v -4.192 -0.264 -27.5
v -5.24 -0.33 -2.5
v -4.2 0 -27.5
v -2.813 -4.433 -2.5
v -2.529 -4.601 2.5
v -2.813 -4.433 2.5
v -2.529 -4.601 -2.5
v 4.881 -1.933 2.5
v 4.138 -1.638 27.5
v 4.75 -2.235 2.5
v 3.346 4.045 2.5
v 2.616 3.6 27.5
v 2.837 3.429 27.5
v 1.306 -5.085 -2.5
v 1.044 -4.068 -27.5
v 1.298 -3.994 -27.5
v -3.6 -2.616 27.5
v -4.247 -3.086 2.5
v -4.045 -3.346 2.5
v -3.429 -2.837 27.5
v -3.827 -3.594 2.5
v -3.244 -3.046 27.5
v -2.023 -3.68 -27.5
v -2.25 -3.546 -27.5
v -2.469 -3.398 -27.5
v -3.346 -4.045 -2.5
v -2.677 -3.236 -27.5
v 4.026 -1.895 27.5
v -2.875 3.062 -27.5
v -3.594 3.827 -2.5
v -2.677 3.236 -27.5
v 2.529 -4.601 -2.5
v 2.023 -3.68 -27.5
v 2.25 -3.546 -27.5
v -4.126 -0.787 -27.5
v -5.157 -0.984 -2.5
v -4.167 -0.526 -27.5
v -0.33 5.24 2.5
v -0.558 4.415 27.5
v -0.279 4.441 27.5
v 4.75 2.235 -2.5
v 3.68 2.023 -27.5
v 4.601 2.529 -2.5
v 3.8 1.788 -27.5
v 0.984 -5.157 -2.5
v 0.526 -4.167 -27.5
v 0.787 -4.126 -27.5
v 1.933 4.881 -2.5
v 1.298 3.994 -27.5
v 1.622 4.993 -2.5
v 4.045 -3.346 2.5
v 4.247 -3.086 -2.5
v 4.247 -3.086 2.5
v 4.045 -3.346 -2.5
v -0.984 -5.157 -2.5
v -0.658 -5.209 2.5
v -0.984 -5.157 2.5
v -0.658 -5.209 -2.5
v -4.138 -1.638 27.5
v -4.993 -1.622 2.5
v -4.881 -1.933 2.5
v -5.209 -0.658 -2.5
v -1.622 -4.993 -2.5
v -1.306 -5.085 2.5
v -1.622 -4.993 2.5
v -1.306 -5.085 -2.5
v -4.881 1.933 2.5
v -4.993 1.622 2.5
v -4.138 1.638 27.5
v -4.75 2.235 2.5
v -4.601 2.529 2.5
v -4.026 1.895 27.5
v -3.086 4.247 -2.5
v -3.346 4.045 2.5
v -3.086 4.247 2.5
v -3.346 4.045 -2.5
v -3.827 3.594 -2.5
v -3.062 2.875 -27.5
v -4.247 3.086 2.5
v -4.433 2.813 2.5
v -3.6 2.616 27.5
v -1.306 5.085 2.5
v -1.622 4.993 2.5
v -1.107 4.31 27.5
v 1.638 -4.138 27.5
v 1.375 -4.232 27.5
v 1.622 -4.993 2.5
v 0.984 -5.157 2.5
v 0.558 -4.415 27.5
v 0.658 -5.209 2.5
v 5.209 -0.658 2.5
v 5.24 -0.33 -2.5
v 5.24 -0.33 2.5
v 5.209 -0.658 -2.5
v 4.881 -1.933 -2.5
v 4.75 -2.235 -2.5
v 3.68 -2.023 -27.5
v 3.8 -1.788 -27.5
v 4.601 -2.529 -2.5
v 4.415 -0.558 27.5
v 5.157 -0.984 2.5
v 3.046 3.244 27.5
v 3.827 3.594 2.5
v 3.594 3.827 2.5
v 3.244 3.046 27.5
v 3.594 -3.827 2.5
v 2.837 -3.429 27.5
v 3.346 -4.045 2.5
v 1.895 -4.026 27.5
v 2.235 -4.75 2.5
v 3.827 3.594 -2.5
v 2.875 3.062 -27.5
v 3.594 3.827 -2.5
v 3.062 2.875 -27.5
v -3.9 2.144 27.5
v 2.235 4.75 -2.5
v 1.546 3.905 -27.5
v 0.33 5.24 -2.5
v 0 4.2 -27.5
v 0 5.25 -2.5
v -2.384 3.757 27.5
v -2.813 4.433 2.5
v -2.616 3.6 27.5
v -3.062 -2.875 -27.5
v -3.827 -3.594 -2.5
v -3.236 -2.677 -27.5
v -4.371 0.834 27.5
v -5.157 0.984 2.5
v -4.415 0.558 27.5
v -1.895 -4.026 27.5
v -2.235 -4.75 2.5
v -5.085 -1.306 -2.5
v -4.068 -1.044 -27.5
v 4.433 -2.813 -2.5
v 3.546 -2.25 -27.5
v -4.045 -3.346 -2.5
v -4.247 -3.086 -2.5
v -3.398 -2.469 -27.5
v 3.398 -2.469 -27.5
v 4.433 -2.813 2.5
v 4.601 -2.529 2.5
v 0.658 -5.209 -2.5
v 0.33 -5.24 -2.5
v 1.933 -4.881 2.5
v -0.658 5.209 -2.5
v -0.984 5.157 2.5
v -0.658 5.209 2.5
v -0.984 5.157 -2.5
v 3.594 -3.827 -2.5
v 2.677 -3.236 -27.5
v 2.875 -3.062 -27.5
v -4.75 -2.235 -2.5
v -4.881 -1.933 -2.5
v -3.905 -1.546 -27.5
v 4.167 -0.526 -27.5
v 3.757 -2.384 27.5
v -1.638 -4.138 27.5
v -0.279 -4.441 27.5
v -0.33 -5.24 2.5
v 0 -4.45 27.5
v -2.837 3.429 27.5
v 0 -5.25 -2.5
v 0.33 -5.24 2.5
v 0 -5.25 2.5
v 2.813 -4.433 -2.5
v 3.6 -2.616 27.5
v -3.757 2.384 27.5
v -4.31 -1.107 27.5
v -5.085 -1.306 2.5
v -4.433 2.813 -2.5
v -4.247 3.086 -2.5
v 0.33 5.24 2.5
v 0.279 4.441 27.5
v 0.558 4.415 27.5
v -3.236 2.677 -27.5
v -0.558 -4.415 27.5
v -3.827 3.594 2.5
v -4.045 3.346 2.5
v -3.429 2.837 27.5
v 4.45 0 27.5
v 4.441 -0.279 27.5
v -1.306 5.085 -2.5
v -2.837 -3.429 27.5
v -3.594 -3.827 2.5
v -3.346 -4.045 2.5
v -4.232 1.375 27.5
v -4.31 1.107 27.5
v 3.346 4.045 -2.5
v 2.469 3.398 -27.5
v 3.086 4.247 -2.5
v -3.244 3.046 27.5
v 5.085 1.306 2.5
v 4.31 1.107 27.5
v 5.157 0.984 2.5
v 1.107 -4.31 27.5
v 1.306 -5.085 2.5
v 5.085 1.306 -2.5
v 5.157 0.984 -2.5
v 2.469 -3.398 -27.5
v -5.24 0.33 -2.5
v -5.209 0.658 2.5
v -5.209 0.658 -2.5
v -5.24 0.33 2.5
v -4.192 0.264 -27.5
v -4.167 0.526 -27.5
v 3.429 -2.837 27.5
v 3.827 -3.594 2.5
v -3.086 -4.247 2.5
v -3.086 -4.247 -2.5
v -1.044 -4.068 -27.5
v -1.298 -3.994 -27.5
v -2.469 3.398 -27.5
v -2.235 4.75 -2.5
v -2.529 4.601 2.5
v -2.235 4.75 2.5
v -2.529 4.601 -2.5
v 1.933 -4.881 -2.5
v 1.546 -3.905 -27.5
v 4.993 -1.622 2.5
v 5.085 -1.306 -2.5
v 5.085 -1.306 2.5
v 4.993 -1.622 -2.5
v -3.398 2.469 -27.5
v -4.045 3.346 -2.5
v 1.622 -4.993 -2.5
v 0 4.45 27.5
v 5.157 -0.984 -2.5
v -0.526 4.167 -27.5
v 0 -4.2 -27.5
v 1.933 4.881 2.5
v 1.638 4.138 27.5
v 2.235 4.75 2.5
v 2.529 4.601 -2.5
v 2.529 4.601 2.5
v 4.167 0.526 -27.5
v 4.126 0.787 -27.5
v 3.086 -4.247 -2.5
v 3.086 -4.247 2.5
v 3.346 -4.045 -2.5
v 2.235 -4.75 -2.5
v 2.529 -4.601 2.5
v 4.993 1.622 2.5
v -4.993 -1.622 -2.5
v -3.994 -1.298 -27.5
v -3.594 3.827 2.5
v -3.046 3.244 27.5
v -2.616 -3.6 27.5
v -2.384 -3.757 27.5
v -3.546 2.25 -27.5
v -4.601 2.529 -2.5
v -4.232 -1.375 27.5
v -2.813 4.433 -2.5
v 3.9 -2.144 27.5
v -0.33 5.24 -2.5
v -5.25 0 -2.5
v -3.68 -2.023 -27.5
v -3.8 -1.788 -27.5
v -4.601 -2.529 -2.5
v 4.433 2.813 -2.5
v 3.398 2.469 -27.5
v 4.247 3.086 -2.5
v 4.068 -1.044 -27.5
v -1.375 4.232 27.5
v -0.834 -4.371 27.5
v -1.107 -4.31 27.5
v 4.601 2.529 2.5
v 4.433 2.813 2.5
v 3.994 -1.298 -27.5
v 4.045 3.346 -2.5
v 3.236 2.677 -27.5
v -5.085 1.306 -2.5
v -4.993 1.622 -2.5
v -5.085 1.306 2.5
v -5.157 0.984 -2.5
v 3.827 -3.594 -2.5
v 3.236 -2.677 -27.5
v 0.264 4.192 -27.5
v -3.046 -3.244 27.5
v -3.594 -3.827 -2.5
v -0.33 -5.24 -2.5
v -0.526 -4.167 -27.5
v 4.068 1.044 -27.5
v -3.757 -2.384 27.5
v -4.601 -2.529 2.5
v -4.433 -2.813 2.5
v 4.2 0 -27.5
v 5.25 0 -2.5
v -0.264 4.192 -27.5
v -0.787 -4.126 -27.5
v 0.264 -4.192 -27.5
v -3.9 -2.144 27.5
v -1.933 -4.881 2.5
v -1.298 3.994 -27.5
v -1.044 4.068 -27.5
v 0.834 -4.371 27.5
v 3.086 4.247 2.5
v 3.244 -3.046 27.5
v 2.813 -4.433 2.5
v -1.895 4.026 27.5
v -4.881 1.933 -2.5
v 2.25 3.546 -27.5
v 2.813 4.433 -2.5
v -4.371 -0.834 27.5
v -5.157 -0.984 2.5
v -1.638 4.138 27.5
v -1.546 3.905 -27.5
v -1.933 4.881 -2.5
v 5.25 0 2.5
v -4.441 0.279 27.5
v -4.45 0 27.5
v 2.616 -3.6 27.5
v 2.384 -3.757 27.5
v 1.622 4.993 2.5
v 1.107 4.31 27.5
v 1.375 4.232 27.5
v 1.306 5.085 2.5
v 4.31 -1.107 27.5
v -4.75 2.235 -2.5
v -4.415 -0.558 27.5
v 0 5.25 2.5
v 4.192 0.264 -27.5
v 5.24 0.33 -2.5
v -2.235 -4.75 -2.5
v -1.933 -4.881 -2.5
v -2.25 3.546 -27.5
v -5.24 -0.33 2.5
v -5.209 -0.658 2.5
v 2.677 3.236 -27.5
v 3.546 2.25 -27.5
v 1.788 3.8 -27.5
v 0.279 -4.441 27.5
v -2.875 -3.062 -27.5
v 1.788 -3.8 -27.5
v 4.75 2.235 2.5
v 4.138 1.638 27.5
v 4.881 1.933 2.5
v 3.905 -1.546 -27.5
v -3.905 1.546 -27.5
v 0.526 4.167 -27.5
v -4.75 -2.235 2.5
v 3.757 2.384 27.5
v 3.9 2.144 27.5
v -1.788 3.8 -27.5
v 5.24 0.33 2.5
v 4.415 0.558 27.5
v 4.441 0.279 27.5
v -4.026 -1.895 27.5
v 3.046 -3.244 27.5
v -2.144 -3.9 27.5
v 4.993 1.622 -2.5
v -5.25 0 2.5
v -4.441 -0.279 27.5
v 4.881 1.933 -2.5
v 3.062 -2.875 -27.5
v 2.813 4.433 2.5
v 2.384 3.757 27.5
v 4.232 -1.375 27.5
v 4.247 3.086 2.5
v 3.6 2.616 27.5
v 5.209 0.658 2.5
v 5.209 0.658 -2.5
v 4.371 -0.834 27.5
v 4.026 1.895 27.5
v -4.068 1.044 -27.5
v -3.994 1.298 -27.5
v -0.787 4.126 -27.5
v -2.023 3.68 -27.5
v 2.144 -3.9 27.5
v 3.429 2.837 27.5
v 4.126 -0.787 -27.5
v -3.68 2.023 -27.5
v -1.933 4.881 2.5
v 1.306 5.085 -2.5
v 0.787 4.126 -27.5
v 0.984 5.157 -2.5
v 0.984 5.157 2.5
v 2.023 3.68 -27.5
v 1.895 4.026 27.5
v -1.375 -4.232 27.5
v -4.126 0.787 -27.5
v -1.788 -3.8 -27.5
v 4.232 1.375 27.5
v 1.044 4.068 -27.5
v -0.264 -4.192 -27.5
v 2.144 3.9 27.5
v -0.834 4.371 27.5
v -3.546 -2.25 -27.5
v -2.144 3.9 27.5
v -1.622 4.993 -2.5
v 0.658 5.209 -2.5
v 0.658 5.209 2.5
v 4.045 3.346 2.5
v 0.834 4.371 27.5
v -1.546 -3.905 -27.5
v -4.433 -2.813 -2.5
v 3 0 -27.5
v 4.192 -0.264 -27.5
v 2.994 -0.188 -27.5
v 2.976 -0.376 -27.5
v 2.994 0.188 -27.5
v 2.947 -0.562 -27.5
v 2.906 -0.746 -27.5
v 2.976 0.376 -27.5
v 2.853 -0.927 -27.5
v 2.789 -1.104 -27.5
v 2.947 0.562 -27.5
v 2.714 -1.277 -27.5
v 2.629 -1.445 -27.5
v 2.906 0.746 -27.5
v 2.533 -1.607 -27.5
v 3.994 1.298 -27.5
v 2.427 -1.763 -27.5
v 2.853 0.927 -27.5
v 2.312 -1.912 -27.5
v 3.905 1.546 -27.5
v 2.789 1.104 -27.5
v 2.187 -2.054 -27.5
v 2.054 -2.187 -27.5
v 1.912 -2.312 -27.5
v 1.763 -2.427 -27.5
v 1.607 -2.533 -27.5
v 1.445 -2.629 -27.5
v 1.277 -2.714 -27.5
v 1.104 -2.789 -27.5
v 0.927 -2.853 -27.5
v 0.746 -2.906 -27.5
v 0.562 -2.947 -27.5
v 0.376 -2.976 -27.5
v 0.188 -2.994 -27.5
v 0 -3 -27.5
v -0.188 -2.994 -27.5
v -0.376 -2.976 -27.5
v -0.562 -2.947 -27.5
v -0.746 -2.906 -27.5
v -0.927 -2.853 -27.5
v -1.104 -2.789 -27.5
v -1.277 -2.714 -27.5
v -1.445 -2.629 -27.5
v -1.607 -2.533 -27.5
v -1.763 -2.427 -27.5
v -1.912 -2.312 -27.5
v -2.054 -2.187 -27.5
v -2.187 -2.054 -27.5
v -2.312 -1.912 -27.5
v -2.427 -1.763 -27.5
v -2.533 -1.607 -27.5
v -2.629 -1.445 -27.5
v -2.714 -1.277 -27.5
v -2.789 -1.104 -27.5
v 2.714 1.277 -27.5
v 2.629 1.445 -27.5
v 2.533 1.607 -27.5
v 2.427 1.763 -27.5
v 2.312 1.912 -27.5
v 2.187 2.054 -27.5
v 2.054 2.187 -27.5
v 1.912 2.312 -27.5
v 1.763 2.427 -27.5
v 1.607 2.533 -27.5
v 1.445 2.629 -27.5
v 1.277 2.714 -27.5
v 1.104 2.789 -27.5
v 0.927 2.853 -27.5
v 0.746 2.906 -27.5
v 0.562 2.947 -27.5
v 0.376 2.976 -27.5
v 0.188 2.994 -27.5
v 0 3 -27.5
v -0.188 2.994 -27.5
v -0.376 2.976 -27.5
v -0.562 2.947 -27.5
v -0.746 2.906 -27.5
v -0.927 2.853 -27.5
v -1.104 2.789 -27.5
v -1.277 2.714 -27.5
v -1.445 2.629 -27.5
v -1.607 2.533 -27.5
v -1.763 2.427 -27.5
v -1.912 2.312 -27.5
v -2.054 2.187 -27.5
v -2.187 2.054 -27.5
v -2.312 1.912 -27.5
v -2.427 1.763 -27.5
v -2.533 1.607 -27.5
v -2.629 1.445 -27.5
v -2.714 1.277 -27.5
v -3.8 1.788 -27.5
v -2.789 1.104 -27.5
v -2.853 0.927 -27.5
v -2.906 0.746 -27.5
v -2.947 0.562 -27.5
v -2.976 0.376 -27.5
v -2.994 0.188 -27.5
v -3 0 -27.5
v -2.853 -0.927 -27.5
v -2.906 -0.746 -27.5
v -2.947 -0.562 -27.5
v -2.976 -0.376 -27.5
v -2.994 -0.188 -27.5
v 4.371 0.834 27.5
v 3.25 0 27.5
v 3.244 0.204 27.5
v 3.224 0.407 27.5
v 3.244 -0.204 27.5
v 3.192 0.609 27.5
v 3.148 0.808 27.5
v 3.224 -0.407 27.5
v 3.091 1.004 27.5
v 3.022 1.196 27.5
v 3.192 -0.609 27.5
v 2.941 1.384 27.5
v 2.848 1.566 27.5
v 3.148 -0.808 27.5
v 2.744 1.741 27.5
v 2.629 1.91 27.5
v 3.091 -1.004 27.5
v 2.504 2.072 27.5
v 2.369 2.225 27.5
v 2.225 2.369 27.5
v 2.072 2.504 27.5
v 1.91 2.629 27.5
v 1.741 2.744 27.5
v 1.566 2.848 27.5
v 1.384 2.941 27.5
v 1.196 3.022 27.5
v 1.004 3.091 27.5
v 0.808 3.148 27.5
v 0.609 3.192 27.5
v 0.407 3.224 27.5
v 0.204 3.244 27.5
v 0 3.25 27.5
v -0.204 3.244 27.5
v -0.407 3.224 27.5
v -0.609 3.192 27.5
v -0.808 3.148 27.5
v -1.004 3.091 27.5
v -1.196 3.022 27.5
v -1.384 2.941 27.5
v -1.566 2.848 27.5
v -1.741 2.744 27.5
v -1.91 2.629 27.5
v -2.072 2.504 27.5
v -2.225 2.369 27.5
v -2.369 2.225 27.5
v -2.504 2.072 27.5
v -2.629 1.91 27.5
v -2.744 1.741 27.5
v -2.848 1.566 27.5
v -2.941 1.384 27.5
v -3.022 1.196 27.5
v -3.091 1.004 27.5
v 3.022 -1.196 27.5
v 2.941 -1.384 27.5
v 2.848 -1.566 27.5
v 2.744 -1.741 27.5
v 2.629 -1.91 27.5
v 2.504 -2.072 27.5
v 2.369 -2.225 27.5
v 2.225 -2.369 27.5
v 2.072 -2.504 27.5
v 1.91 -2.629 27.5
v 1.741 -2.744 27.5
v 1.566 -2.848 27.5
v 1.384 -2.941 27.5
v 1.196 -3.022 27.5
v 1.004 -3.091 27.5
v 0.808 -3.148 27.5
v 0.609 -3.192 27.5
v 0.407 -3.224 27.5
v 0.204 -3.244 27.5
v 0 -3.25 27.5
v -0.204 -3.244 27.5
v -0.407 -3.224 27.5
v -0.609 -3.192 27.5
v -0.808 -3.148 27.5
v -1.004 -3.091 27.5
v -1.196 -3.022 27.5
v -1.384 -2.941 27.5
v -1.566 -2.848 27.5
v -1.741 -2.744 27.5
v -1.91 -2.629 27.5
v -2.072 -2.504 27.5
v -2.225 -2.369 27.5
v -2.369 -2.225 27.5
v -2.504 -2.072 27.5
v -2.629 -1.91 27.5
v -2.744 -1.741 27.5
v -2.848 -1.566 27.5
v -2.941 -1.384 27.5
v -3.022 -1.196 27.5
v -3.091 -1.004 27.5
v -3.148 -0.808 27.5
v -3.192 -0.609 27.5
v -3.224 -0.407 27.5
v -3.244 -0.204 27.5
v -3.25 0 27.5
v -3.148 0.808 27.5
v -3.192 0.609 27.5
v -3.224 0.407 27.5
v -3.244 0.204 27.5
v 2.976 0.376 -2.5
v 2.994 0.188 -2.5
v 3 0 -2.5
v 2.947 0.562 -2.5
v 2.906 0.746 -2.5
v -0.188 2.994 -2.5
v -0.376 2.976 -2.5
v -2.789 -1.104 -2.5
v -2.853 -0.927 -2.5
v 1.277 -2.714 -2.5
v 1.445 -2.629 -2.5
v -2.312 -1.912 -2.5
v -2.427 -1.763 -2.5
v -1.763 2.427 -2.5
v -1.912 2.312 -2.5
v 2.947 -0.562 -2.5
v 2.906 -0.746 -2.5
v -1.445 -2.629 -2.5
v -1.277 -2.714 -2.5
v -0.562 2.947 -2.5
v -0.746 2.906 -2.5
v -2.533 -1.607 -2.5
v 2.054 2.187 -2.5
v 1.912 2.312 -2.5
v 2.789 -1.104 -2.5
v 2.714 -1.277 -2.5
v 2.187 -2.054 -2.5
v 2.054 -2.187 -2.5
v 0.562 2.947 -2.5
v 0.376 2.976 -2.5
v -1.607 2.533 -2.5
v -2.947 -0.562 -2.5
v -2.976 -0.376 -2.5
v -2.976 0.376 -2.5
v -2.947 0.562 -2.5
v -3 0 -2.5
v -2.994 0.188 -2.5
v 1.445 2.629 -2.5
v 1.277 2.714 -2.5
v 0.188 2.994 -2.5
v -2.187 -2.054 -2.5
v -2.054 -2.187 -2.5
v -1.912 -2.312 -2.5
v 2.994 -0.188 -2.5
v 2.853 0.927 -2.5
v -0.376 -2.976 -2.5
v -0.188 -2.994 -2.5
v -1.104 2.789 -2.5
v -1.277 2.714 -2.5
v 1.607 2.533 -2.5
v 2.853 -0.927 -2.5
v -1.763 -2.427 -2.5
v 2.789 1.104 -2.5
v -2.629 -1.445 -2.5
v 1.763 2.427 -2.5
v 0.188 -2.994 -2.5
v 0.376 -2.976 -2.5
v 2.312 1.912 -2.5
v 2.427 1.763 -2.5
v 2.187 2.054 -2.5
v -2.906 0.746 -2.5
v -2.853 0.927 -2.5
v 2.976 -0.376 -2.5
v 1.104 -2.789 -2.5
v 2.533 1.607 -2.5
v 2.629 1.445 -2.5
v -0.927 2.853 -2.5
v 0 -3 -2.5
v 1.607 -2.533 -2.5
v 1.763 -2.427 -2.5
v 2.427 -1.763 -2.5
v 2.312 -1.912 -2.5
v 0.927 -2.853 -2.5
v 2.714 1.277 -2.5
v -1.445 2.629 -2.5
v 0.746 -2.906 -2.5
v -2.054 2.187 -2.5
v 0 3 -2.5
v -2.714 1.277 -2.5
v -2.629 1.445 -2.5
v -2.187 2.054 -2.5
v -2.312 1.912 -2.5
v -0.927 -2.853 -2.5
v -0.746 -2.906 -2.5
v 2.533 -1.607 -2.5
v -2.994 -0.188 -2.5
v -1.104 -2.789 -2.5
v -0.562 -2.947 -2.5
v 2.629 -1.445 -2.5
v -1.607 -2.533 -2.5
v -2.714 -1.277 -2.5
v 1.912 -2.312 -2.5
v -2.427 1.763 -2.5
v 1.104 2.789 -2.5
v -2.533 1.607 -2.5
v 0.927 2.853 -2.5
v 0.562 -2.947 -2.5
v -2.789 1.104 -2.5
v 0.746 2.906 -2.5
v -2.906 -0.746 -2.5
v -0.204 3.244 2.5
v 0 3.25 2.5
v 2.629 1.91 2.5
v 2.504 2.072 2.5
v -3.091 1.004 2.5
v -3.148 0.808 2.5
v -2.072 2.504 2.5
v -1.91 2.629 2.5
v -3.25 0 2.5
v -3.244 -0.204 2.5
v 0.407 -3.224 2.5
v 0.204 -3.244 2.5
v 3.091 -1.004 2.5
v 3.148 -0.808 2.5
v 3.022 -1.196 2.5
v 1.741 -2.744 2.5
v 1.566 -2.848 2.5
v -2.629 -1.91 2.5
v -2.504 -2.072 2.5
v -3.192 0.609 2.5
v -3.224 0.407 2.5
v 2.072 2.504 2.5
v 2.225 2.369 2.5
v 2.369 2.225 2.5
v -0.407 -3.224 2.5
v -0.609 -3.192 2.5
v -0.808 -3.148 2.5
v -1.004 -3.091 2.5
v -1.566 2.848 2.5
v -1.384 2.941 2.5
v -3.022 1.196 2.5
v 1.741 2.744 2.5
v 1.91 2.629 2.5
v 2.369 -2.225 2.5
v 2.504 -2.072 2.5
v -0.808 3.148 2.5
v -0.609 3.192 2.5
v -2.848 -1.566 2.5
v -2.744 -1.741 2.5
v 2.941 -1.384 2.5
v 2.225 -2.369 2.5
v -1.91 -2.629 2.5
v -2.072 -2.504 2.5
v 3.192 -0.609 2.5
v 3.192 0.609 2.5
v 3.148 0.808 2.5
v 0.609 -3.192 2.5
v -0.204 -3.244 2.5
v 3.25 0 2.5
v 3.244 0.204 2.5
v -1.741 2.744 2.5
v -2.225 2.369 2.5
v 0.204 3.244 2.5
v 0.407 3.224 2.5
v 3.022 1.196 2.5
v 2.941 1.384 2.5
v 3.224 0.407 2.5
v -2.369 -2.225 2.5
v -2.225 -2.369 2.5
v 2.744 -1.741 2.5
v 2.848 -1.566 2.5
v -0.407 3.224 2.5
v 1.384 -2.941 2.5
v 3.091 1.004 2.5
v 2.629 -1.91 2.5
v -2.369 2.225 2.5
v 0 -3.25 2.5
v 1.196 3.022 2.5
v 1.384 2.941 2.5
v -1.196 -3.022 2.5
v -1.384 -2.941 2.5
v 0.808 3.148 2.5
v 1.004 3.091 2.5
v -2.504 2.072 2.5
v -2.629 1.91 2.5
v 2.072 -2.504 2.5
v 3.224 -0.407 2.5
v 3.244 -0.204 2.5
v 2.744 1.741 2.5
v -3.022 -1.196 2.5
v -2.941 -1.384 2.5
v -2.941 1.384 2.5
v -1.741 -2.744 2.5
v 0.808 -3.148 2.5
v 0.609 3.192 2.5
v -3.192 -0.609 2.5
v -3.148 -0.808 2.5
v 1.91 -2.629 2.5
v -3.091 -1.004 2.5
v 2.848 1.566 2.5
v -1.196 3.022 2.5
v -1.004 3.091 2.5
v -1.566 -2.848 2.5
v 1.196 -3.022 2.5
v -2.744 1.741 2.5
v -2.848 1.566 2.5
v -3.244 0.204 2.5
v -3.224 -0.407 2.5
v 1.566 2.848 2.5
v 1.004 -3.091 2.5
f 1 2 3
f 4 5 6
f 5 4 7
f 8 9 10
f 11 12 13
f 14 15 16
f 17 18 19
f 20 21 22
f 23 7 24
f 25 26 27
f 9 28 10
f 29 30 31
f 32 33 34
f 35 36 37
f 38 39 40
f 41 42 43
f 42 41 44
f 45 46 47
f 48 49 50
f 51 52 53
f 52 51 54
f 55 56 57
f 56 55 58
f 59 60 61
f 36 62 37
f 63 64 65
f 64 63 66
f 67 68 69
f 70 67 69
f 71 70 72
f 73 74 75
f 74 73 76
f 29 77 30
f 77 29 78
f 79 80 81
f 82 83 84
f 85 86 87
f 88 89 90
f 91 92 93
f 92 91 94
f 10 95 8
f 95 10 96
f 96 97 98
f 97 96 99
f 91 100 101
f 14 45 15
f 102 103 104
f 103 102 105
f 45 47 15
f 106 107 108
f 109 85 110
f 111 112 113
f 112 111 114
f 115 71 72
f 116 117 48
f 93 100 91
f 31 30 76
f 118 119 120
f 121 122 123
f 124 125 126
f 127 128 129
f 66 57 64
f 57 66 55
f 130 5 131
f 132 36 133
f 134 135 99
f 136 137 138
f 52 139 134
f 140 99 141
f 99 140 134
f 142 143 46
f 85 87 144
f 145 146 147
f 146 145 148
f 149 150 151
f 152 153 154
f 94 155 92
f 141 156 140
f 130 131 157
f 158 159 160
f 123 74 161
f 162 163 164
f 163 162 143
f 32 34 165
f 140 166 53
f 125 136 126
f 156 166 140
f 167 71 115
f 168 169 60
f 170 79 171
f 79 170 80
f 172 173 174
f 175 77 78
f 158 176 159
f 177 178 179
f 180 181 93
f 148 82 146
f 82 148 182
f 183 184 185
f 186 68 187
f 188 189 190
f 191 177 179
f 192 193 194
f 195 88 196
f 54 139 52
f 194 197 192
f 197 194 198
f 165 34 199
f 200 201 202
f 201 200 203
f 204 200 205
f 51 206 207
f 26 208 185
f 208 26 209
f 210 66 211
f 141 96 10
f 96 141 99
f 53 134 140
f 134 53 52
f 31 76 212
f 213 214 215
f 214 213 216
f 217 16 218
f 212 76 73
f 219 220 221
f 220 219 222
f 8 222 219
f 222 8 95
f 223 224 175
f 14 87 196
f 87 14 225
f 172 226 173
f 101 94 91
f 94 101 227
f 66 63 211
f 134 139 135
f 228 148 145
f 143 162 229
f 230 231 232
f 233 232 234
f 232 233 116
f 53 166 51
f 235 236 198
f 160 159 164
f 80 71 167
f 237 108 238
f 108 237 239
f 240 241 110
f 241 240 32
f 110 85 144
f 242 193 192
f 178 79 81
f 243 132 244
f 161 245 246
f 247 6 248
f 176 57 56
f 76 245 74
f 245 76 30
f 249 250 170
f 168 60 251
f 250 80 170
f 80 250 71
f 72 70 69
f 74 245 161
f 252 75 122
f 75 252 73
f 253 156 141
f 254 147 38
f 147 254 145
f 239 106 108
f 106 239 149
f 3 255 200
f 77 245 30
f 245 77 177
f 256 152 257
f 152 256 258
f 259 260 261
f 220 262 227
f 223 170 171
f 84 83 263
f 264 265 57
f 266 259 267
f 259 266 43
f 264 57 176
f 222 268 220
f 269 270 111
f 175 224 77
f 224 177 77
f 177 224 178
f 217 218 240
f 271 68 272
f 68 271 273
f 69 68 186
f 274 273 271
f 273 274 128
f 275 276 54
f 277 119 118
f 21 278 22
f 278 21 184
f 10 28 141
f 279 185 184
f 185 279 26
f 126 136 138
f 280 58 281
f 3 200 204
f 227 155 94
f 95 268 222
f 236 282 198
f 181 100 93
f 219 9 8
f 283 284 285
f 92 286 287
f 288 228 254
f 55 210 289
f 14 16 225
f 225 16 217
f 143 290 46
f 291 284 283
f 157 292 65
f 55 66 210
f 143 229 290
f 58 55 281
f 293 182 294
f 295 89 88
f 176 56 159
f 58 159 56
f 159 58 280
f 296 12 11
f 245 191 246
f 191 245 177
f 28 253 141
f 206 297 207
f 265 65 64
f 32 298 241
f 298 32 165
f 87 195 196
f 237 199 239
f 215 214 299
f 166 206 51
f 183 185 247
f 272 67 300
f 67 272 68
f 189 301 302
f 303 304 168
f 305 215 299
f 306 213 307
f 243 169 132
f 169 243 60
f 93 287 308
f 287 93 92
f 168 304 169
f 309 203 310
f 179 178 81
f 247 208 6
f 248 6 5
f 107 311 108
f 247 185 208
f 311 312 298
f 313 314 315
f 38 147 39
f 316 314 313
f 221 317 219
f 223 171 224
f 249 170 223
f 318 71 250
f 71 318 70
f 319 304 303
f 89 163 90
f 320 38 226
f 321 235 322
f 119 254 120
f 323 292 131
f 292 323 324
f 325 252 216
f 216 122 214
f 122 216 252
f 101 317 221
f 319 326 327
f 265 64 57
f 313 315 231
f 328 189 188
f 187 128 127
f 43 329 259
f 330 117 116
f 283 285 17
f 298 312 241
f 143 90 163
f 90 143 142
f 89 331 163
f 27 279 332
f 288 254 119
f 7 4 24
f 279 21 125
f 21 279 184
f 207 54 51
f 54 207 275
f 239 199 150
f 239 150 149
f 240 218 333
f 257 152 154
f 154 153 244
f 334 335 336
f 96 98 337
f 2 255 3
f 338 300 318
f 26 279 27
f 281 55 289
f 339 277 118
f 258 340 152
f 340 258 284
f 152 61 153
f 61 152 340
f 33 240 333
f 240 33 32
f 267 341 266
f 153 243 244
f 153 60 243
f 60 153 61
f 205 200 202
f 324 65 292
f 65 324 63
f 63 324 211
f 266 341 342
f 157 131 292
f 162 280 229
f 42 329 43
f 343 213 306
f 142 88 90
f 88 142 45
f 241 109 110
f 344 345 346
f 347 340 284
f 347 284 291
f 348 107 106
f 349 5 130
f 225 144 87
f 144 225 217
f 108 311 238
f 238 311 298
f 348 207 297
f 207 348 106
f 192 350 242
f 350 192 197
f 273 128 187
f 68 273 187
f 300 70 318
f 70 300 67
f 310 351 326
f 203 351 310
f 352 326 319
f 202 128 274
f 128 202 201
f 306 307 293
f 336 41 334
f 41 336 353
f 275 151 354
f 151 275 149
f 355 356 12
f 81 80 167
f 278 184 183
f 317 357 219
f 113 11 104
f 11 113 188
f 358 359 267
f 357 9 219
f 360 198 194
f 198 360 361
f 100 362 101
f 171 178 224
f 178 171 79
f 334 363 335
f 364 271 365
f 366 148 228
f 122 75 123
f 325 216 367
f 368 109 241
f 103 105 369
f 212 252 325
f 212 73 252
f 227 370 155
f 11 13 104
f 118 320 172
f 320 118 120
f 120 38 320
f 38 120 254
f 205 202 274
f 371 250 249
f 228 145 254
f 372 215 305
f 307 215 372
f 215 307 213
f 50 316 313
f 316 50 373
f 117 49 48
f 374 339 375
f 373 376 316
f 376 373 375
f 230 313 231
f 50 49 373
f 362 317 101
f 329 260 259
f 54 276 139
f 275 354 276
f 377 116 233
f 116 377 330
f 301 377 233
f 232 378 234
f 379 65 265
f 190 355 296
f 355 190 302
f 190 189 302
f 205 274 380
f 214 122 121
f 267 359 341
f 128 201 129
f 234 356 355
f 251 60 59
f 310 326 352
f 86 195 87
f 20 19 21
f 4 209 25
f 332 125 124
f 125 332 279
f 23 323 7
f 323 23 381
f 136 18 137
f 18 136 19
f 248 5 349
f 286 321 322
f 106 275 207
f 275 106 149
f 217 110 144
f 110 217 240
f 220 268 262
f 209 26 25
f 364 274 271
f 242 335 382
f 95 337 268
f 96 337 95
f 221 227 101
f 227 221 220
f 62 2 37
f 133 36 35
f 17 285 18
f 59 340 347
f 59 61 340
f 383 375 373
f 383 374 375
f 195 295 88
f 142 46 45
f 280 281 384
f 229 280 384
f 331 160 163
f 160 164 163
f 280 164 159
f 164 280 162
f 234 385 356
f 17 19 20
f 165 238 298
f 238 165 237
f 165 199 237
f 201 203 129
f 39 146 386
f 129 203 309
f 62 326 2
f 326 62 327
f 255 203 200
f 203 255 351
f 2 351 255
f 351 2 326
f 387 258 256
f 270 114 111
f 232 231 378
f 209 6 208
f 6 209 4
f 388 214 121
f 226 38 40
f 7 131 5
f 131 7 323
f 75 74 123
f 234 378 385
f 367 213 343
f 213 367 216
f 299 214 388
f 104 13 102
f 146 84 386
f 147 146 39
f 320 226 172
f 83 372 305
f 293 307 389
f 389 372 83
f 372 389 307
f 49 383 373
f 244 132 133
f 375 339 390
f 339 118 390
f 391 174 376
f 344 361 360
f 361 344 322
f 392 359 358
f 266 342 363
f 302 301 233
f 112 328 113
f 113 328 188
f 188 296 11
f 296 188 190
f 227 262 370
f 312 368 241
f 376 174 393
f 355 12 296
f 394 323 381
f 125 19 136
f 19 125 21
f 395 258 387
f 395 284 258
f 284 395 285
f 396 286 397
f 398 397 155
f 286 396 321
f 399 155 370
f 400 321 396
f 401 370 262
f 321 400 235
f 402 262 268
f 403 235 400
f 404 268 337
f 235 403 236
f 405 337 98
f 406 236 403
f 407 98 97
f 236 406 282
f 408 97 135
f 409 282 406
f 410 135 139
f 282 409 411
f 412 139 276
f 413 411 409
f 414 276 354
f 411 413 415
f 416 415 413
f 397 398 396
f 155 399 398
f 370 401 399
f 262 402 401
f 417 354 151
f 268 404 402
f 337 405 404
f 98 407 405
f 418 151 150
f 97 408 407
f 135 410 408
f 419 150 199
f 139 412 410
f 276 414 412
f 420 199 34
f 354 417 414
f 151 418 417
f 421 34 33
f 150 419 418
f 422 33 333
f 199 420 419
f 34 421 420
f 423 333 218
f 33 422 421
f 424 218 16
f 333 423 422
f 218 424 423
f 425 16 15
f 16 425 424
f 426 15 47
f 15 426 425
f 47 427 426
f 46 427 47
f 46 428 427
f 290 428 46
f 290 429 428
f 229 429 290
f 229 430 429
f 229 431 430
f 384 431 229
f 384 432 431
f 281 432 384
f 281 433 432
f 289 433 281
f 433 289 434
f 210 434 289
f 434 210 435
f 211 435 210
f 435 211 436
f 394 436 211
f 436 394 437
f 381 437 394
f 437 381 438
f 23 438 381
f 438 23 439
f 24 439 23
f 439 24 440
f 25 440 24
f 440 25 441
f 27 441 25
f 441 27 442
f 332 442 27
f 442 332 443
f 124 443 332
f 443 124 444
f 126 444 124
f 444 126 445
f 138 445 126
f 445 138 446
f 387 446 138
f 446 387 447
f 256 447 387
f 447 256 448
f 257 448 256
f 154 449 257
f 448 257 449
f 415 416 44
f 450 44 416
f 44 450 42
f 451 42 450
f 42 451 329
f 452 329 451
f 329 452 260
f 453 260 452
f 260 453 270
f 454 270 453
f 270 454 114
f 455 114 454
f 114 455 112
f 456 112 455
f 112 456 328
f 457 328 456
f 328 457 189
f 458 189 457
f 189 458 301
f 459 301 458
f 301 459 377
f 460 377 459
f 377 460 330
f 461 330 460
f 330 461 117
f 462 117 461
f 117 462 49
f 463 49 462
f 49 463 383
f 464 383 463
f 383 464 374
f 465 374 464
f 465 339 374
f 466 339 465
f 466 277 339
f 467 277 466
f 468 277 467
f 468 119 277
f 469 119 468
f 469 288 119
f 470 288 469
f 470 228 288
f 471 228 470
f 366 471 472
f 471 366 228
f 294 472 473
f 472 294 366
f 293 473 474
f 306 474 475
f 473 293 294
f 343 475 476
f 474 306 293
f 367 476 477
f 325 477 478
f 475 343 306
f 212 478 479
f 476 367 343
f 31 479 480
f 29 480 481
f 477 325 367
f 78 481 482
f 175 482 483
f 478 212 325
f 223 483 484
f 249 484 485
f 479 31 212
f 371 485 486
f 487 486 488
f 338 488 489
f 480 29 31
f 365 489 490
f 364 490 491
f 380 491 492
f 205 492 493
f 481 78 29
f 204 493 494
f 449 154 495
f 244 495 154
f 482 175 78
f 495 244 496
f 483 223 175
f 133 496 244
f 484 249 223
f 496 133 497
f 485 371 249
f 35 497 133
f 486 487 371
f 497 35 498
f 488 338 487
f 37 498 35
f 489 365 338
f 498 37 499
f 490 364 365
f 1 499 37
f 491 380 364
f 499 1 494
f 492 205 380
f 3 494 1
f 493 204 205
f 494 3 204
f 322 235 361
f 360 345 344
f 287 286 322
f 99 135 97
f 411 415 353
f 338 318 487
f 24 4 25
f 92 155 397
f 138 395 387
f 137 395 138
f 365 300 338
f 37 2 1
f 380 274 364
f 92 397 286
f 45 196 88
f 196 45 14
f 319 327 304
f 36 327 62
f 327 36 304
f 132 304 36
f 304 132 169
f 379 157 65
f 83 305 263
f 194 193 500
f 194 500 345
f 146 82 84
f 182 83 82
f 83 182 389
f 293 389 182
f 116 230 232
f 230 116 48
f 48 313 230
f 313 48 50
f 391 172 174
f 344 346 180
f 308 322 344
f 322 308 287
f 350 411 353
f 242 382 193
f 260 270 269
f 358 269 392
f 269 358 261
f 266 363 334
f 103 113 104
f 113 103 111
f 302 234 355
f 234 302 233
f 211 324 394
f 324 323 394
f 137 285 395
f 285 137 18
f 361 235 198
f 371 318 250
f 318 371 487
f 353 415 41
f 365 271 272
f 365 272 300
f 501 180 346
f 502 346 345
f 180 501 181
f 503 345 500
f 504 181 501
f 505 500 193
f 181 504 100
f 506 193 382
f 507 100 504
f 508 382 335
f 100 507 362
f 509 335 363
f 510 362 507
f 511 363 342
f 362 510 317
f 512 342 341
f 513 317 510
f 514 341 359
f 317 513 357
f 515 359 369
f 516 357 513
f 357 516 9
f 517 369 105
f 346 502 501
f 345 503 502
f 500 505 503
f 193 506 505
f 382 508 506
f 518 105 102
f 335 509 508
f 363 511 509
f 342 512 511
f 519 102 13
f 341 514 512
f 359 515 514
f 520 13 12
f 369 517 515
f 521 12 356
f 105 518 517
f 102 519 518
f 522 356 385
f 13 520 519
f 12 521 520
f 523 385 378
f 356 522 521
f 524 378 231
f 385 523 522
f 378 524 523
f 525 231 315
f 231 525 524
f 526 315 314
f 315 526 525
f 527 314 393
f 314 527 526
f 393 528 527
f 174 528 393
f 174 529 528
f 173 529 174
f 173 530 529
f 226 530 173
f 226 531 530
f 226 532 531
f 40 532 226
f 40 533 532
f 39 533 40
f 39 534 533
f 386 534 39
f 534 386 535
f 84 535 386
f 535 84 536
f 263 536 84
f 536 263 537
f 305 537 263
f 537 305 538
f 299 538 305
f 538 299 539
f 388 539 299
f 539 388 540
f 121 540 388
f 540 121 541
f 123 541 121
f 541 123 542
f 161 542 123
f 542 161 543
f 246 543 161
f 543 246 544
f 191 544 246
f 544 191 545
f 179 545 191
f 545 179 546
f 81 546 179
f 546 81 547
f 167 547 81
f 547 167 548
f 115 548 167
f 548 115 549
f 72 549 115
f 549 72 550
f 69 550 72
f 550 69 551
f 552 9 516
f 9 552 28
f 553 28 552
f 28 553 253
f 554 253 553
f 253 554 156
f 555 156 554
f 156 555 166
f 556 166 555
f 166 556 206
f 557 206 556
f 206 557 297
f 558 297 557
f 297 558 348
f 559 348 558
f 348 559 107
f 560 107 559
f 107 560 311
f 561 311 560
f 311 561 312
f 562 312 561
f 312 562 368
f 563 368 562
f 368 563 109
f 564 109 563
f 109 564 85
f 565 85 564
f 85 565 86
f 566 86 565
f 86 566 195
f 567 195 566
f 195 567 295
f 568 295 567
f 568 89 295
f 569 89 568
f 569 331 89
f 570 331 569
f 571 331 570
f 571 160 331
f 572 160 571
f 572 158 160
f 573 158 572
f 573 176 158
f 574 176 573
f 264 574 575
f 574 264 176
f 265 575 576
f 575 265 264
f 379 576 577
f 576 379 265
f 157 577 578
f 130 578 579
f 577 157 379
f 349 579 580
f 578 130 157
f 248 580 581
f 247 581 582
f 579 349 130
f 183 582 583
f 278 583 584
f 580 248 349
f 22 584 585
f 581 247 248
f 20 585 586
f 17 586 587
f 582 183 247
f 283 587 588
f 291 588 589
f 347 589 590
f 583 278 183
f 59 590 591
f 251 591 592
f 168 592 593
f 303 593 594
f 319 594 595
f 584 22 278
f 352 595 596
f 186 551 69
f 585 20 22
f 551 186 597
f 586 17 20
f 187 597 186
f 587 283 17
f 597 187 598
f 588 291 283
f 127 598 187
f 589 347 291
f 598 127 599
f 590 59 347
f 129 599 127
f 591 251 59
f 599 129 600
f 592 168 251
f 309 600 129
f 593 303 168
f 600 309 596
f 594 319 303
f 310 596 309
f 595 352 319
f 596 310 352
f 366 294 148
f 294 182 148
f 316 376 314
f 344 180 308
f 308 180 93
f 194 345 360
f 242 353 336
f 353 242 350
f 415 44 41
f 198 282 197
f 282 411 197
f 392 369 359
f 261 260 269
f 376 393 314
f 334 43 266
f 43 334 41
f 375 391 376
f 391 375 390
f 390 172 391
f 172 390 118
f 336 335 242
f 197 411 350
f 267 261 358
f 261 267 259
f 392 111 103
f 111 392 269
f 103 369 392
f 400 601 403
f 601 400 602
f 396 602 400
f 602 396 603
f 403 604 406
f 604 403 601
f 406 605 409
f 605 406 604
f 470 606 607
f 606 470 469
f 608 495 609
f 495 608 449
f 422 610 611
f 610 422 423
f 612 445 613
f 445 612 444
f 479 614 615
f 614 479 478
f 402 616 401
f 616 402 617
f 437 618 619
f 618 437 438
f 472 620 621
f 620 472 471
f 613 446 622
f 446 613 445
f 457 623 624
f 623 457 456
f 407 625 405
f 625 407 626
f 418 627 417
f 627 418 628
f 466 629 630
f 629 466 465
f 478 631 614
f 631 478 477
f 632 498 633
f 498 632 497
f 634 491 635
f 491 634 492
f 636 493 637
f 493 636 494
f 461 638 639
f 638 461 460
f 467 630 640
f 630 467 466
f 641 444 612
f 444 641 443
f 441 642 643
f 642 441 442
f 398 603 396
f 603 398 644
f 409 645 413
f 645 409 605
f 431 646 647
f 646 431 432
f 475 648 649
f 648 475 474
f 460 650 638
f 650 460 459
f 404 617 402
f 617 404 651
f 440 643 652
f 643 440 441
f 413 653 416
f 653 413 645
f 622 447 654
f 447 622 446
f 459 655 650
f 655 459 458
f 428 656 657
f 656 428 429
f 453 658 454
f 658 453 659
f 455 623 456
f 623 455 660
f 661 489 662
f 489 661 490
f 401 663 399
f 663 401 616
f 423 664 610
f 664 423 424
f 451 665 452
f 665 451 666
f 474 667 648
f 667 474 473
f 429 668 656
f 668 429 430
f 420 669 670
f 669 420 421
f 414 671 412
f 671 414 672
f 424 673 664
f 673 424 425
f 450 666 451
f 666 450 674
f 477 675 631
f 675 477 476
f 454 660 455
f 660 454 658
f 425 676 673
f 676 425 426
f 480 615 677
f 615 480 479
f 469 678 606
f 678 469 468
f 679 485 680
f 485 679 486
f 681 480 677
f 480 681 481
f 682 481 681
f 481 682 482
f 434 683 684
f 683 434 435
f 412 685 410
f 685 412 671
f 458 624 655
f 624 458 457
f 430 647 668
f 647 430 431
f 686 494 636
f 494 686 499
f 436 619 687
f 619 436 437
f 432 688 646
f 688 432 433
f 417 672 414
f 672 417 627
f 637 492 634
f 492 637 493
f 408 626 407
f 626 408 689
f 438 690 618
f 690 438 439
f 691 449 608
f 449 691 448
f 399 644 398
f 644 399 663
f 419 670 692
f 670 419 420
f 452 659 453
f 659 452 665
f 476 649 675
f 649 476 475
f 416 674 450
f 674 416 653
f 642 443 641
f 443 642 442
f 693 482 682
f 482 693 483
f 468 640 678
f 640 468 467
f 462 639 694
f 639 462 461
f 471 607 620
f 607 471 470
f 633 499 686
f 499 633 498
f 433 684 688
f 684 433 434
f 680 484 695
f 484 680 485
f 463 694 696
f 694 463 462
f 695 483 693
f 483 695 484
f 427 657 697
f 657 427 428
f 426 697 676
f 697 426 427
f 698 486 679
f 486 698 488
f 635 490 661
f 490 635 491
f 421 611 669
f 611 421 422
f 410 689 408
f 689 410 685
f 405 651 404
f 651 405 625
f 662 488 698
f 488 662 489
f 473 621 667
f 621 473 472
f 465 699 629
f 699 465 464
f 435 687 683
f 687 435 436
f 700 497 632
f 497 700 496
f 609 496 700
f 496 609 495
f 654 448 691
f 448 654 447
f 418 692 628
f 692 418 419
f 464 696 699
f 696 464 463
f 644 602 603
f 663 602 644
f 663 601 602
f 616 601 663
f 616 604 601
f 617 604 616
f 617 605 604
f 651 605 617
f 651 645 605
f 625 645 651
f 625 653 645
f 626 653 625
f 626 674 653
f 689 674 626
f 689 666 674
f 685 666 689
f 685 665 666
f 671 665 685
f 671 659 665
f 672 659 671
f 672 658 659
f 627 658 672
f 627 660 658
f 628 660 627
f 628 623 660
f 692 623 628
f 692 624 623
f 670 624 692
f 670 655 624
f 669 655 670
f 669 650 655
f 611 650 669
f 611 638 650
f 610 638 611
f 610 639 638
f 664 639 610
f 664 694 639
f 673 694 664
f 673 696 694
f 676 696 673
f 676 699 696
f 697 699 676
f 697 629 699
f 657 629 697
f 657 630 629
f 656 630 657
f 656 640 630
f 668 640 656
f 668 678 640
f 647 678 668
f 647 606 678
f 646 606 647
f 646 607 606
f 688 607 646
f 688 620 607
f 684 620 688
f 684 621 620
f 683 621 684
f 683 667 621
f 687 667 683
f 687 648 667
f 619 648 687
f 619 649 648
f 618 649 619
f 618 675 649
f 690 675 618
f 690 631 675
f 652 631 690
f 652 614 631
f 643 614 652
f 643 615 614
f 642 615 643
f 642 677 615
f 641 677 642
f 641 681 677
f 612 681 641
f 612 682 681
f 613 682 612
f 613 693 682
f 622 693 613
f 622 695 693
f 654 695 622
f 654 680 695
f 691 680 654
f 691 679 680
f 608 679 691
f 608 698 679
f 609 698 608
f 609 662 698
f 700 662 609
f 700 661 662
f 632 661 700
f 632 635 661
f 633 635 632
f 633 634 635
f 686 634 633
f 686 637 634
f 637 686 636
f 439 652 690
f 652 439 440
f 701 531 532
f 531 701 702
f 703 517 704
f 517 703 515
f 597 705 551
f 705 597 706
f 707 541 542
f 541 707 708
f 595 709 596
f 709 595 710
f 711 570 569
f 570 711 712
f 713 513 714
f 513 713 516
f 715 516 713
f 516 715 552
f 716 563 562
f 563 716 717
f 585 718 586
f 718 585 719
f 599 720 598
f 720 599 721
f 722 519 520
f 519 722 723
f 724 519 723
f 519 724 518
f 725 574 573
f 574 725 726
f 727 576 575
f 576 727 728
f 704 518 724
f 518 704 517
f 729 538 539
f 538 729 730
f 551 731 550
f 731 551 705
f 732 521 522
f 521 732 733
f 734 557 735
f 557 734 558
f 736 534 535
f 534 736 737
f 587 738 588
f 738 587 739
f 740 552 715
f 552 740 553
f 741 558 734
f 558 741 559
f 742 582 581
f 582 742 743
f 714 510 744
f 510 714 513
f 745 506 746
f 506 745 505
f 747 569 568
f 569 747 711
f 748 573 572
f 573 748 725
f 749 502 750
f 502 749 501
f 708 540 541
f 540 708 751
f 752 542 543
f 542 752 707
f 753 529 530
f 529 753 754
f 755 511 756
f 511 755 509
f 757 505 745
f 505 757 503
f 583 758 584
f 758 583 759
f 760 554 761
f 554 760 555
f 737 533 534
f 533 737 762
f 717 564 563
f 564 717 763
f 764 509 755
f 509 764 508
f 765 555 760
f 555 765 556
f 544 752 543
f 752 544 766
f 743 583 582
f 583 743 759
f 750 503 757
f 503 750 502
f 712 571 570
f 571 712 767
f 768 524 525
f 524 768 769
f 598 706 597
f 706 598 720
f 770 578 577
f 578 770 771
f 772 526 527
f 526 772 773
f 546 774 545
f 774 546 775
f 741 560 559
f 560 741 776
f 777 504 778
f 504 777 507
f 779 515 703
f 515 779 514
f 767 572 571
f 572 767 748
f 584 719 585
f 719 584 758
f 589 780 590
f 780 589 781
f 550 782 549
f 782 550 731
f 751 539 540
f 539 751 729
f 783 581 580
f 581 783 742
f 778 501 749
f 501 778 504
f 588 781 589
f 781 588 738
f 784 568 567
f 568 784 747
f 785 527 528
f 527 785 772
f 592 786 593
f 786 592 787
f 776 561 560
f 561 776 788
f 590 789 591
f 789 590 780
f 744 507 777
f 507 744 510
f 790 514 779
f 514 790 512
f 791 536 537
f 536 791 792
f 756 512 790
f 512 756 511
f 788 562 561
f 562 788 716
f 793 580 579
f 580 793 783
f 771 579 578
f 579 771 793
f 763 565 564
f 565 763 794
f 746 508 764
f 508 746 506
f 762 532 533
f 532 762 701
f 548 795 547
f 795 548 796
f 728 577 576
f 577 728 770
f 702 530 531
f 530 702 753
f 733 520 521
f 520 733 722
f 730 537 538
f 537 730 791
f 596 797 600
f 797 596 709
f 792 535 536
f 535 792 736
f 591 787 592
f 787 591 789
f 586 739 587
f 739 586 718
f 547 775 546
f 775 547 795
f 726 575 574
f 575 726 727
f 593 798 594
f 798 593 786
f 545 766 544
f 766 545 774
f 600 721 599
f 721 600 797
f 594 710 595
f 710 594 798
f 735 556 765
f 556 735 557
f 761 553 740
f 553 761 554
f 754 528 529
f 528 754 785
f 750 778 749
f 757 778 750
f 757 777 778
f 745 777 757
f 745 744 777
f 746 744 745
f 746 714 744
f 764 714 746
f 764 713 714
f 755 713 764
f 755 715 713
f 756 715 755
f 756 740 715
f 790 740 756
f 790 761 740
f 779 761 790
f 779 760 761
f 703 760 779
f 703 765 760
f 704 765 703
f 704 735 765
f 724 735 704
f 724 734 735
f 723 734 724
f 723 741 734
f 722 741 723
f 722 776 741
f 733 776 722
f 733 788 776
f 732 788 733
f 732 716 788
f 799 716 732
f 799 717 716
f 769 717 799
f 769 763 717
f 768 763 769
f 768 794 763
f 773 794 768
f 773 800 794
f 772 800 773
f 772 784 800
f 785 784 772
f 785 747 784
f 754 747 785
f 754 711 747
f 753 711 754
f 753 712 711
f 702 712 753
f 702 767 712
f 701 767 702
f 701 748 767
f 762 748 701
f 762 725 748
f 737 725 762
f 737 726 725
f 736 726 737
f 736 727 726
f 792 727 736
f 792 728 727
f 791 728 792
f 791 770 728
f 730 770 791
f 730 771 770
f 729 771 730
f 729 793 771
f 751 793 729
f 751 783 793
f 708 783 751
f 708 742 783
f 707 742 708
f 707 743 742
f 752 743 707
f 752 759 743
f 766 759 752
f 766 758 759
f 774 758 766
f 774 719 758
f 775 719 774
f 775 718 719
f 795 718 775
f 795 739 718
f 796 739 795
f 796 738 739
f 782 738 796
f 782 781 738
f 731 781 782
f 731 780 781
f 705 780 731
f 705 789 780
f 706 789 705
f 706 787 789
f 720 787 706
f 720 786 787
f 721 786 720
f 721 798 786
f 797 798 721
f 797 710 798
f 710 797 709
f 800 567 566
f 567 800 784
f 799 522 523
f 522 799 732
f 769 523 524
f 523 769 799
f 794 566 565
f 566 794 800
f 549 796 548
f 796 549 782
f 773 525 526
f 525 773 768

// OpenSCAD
// 自転車用安全フラッグの棒（ポール）コネクター
// 径の異なる2本の棒（5.5mmと6.0mm）を接続します

/* [基本設定] */
// 1本目の棒の径 (mm)
pole1_diameter = 5.5; 
// 2本目の棒の径 (mm)
pole2_diameter = 6.0; 
// はめ込みの余裕（プリンタの精度に合わせて調整してください）
tolerance = 0.5; 

/* [詳細設定] */
// 差し込み口の肉厚 (mm)
wall_end = 1.2;
// 中央部の肉厚 (mm)
wall_center = 2.0;
// 各ポールの差し込み深さ (mm)
insertion_depth = 25.0;
// 中央のストッパー（仕切り）の厚み (mm)
stop_thickness = 5.0;

/* [レンダリング設定] */
// 円の細かさ
$fn = 100;

// --- 計算値 ---
d1 = pole1_diameter + tolerance;
d2 = pole2_diameter + tolerance;
// 端部と中央部の外径を計算
outer_d1_end = d1 + (wall_end * 2);
outer_d2_end = d2 + (wall_end * 2);
outer_d_center = max(d1, d2) + (wall_center * 2);
total_length = (insertion_depth * 2) + stop_thickness;

module flag_connector() {
    difference() {
        // 外形（メインボディ：中央に向かって太くなる形状）
        hull() {
            // 下端
            translate([0, 0, -total_length/2])
                cylinder(h = 0.1, d = outer_d1_end);
            // 中央部
            cylinder(h = stop_thickness, d = outer_d_center, center = true);
            // 上端
            translate([0, 0, total_length/2 - 0.1])
                cylinder(h = 0.1, d = outer_d2_end);
        }

        // 下側の穴 (Pole 1: 5.5mm用)
        translate([0, 0, -total_length/2 - 0.1])
            cylinder(h = insertion_depth + 0.1, d = d1);

        // 上側の穴 (Pole 2: 6.0mm用)
        translate([0, 0, stop_thickness/2])
            cylinder(h = insertion_depth + 0.1, d = d2);
            
        // オプション: どちらが太い方か分かるように目印（小さな面取りなど）
        // ここでは単純なシリンダー形状にしています
    }
}

// 実行
flag_connector();

// プレビュー用に横にポールのダミーを表示（レンダリング時は無視されます）
% translate([0, 0, stop_thickness/2 + 5]) cylinder(h = 30, d = pole2_diameter);
% translate([0, 0, -stop_thickness/2 - 35]) cylinder(h = 30, d = pole1_diameter);
